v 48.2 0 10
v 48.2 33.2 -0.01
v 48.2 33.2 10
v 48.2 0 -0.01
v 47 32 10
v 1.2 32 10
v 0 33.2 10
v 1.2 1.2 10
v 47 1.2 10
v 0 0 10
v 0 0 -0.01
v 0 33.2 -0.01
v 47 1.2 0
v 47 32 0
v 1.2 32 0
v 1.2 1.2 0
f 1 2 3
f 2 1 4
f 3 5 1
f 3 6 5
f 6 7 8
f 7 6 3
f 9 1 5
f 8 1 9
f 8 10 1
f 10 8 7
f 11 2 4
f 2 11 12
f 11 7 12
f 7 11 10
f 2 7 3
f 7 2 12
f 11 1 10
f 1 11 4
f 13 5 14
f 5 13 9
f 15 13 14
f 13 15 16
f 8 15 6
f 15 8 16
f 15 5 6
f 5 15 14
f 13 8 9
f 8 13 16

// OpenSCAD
// file: ../Base/Rotation.scad
// Fischertechnik Box Foundation
// Geometry Helpers Rotation

include <PlacementOptions.scad>

// getRotatedSpace(space, rotation=NoRotation)
// Rotates the space dependent on the specified rotation

function getRotatedSpace(space, rotation=NoRotation) = [
    (rotation == Rotate90 || rotation == Rotate270) ? space.y : space.x,
    (rotation == Rotate90 || rotation == Rotate270) ? space.x : space.y
];

// Rotates the given space around the fixed left lower corner
// space = the space the children needs as width/depth list [width,depth]
// rotation = 0 Rotate0 degrees, 1 Rotate90 degrees, 2 Rotate180 degrees, 3 Rotate270 degrees (equivalent to -90)

module RotateFix(space, rotation=NoRotation) {
    dy = (rotation == Rotate0 || rotation == Rotate270) ? 0 :
        (rotation == Rotate90) ? space.x :
        space.y;
    dx = (rotation < Rotate180) ? 0 :
        (rotation == Rotate180) ? space.x :
        space.y;
    
    translate([dx, dy, 0])
        rotate([0, 0, rotations[rotation]])
            children();
}
// file: ../Base/Alignment.scad
// Fischertechnik Box Foundation
// Geometry Helpers Alignment

include <PlacementOptions.scad>

// getAlignedX(elementWidth, spaceWidth, align=AlignRight, offset=0)
// Gets the aligned X offset of an element with the given
// width in the given space.
// elementWidth = The width of the element to positon
// spaceWidth = The space where the element should be aligned
// align = 0 AlignLeft, 1 AlignCenter, 2 AlignRight
// offset = an optional offset from the aligned position. When
// aligned left or centered, then positive values are in X direction.
// When aligned right then positive values are in negative X direction.

function getAlignedX(elementWidth, spaceWidth, align=AlignRight, offset=0) =
    (align == AlignLeft) ?
        offset :
        ((align == AlignCenter) ?
        (spaceWidth - elementWidth)/2 + offset :
        spaceWidth - offset - elementWidth);

// getAlignedY(elementDepth, spaceDepth, align=AlignTop, offset=0)
// Gets the aligned Y offset of an element with the given
// depth in the given space.
// elementDepth = The depth of the element to positon
// spaceDepth = The space where the element should be aligned
// align = 0 AlignBottom, 1 AlignCenter, 2 AlignTop
// offset = an optional offset from the aligned position. When
// aligned bottom or centered, then positive values are in Y direction.
// When aligned top then positive values are in negative Y direction.

function getAlignedY(elementDepth, spaceDepth, align=AlignTop, offset=0) =
    (align == AlignBottom) ?
        offset :
        ((align == AlignCenter) ?
        (spaceDepth - elementDepth)/2 + offset :
        spaceDepth - offset - elementDepth);
// file: ../Base/PlacementOptions.scad
// Fischertechnik Box Foundation
// Placement Options

// Alignment
NoAlign = 0;
AlignLeft = 1;
AlignBottom = 2;
AlignCenter = 3;
AlignRight = 4;
AlignTop = 5;

// Element rotation degree steps
rotations = [0, -90, -180, -270];

// Rotation
NoRotation = 0;
Rotate0 = 0;
Rotate90 = 1;
Rotate180 = 2;
Rotate270 = 3;

// Docking (seen from above)
NoDock = -1;
DockLeft = 0;
DockTop = 1;
DockRight = 2;
DockCorner = 2;
DockBottom = 3;

// Web corners
LowerLeft = 0;
UpperLeft = 1;
UpperRight = 2;
LowerRight = 3;

// Web position relative to corner
LeftOfCorner = 0;
RightOfCorner = 1;
// file: ../Base/Boxes.scad
// Fischertechnik Box Foundation
// Pre-designed Boxes

use <Constants.scad>

include <PlacementOptions.scad>

box190Width = 190;
box190Depth = 130;
box130Width = 130;
box130Depth = 95;

// Values are from an original ec3 box
topBottomDifference = 1.5;
outerHeight = 40;
baseThickness = 1.8;
innerHeight = outerHeight - baseThickness;
stackExcess = 5.7;
radius = 3.5;
wallThickness = 1.5;
tolerance = 0.2;

boxWallThickness = wallThickness;
boxBaseThickness = baseThickness;
boxWebWidth = 3.0;

// getBoxWallThickness()
// Gets the wall thickness of a Fischertechnik Box
function getBoxWallThickness() = boxWallThickness;

// getBoxUsageHeight(height = 38.2)
// Gets the usable height of a Fischertechnik box
// height = Outer height of the box from the bottom to the upper edge.
function getBoxUsageHeight(height = outerHeight) = height - baseThickness - stackExcess;

// getBoxInnerHeight()
// Gets the inner height of a Fischertechnik box, including the stack excess
function getBoxInnerHeight() = innerHeight;

// getBoxBaseThickness()
// Gets the thickness of the Fischertechnik box base.
function getBoxBaseThickness() = boxBaseThickness;

// getBoxWebWidth()
// Gets the width of a box web
function getBoxWebWidth() = boxWebWidth;

// getBox190Space()
// Gets the usable inner space of a Box 190 as an x/y-list
function getBox190Space() = [
    box190Width - 2*getBoxWallThickness() - topBottomDifference, 
    box190Depth - 2*getBoxWallThickness() - topBottomDifference ];

// RoundedCornerPlate(width, depth, height, radius)
// Creates a body plate with rounded corners for a box. Used
// also to create the complete box with the hull module.
// width = Width of the plate
// depth = depth of the plate 
// height = thickness of the plate
// radius = radius of the rounded corner
module RoundedCornerPlate(width, depth, height, radius) {
    translate([radius, radius])
    hull() {
        w = width-2*radius;
        d = depth-2*radius;
        cube([w, d, height]);
        cylinder(height, r=radius, $fn=getFragments());
        translate([w, 0])
            cylinder(height, r=radius, $fn=getFragments());
        translate([w, d])
            cylinder(height, r=radius, $fn=getFragments());
        translate([0, d])
            cylinder(height, r=radius, $fn=getFragments());
    }
}

// BoxBase(width, depth)
// Creates an empty stackable Fischertechnik compatible box
// width = Outer width of the box (190, 130, ...)
// depth = Outer depth of the box (130, 95, ...)

module BoxBase(width, depth, height=outerHeight) {    
    thinPlate = 0.01;

    innerHeight = height - baseThickness;    
    
    module Body(tolerance=tolerance) {
        hull() {
            // Bottom with tolerance to fit into the original boxes when stacked
            translate([-wallThickness+tolerance, -wallThickness+tolerance, -baseThickness])
                RoundedCornerPlate(width-topBottomDifference-2*tolerance, depth-topBottomDifference-2*tolerance, thinPlate, radius);
            
            // Top
            translate([-wallThickness-topBottomDifference/2, -wallThickness-topBottomDifference/2, innerHeight-thinPlate])
                RoundedCornerPlate(width, depth, thinPlate, radius);
         }
    }

    module Cutoff() {
        hull() {
            coWidth = width - 2*wallThickness;
            coDepth = depth - 2*wallThickness;
            
            // Bottom
            RoundedCornerPlate(coWidth-topBottomDifference, coDepth-topBottomDifference, thinPlate, radius);

            // Top
            translate([-topBottomDifference/2, -topBottomDifference/2, innerHeight+thinPlate]) 
                RoundedCornerPlate(coWidth, coDepth, thinPlate, radius);
        }
    }
    
    difference() {        
        Body();
        Cutoff();
        stackOffset = innerHeight - stackExcess;
        translate([0, 0, stackOffset + baseThickness])
            Body(tolerance=0);
    }
}

// Creates the Fischertechnik empty box 130x190 mm and places it at position 0,0
// 190x130 are the outer sizes, the inner space is slightly smaller. Use getBox190Space() to get the inner sizes.
// The box is positioned that the usable inner space is at the 0,0,0 position.

module Box190() {
    BoxBase(box190Width, box190Depth);
}

// Gets the usable inner space of a Box 130 as an x/y-list
function getBox130Space() = [
    box130Width - 2*getBoxWallThickness() - topBottomDifference, 
    box130Depth - 2*getBoxWallThickness() - topBottomDifference ];

// Creates the Fischertechnik empty box 95x130 mm and places it at position 0,0
// 190x130 are the outer sizes, the inner space is slightly smaller. Use getBox190Space() to get the inner sizes.
// The box is positioned that the usable inner space is at the 0,0,0 position.

module Box130() {
    BoxBase(box130Width, box130Depth);
}

// Creates a web at the specified box walls
// corner 0 = LowerLeft, 1 = UpperLeft, 2 = UpperRight, 3 = LowerRight
// side 0 = LeftOfCorner, 1 = RightOfCorner
// distance = Distance in mm from the corner
// boxSpace = inner width and depth of the box (default: Box 190)
// webWidth = length of the web (default is 3 mms)
// webThickness = thickness of the web (default is 1 mm)
// height = Height of the web (standard is getBoxUsageHeight())
// sink = How much of the web is sunk into the wall

module BoxWeb(
    corner, 
    side, 
    distance, 
    boxSpace=getBox190Space(), 
    webWidth=getBoxWebWidth(), 
    webThickness=1.0, 
    height=getBoxUsageHeight(),
    sink = getBoxWallThickness()/2) {
    width = (corner % 2 == 0) ? 
            (side == LeftOfCorner ? webWidth : webThickness) :
            (side == LeftOfCorner ? webThickness : webWidth);

    depth = (corner % 2 == 0) ? 
            (side == RightOfCorner ? webWidth : webThickness) :
            (side == RightOfCorner ? webThickness : webWidth);
    
    xDiff = corner == LowerLeft ? 
                (side == LeftOfCorner ? -sink : distance) :
            (corner == UpperLeft ?                
                (side == LeftOfCorner ? distance : -sink) :
            (corner == UpperRight ?
                (side == LeftOfCorner ? boxSpace.x-webWidth+sink : boxSpace.x-distance-webThickness) :
                (side == LeftOfCorner ? boxSpace.x-distance-webThickness: boxSpace.x-webWidth+sink)));

    yDiff = corner == LowerLeft ? 
                (side == RightOfCorner ? -sink : distance) :
            (corner == UpperLeft ?
                (side == RightOfCorner ? boxSpace.y-distance-webThickness : boxSpace.y-webWidth+sink) :
            (corner == UpperRight ?
                (side == RightOfCorner ? boxSpace.y-webWidth+sink : boxSpace.y-distance-webThickness) :
                (side == RightOfCorner ? distance : -sink)));
    
    translate([xDiff, yDiff, -getExcess()])
        cube([width, depth, height + 2*getExcess()]);
}
// file: ../Base/Placement.scad
// Fischertechnik Box Foundation
// Geometry Helpers Placement

use <Constants.scad>
use <Alignment.scad>
use <Rotation.scad>
use <Boxes.scad>

include <PlacementOptions.scad>

// Place(x=0, y=0, elementSpace=[0,0], alignX=AlignLeft, alignY=AlignBottom, rotation=Rotate0, boxSpace=getBox190Space())
// Places the child at the specified position
// y = Y-Position. This is a relative position when an X aligment is specified.
// x = X-Position. This is a relative position when an Y aligment is specified.
// elementSpace = space of the element to be placed [x,y]
// alignX = -1=NoAlign, 0 AlignLeft, 1 AlignCenter, 3 AlignRight (elementSpace and boxSpace required!)
// alignY = -1=NoAlign, 2 AlignBottom, 1 AlignCenter, 4 AlignTop (elementSpace and boxSpace required!)
// rotation = 0 Rotate0 0 degrees, 1 Rotate90 90 degrees, 
// 2 Rotate180 180 degrees, 3 Rotate270 270 degrees (equivalent to -90)
// boxSpace = Inner space of the box where the placement occurs [x,y] - default is Box 190x130 inner space

module Place(x=0, y=0, elementSpace=[0,0], 
  alignX=AlignLeft, alignY=AlignBottom, 
  rotation=NoRotation, boxSpace=getBox190Space()) {

    module Position(x, y, space, rotation=Rotate0) {
        translate([x, y, 0])
            RotateFix(space, rotation)
                children();
    }

    space = getRotatedSpace(elementSpace, rotation);
    alignedX = getAlignedX(space.x, boxSpace.x, alignX, x);
    alignedY = getAlignedY(space.y, boxSpace.y, alignY, y);
    Position(alignedX, alignedY, elementSpace, rotation)
        children();
}

// Center(space=getBox130Space(), elementSpace=[0,0])
// space = Space where the children is centered. For cylinder use centered=true and no elementSpace.
// elementSpace = space of the element to be centered [x,y]

module Center(space=getBox190Space(), elementSpace=[0,0]) {
    Place(elementSpace=elementSpace, boxSpace=space, alignX=AlignCenter, alignY=AlignCenter)
        children();
}

// CenterHorizontal(width=0, y=0, offset=0, space=getBox130Space())
// width = Width of the element to be placed.
// y = Y position of the element
// offset = Offset from the center position (negative will be left of the center)
// space = Space where the element is placed

module CenterHorizontal(width=0, y=0, offset=0, space=getBox190Space()) {
    Place(x=offset, y=y, elementSpace=[width, 0], boxSpace=space, alignX=AlignCenter)
        children(0);
}

// CenterVertical(depth=0, x=0, offset=0, space=getBox130Space())
// depth = Depth of the element to be placed.
// x = X position of the element
// offset = Offset from the center position (negative will be down of the center)
// space = Space where the element is placed

module CenterVertical(depth=0, x=0, offset=0, space=getBox190Space()) {
    Place(x=x, y=offset, elementSpace=[0, depth], boxSpace=space, alignY=AlignCenter)
        children(0);
}

// getIsVertical(align)
// True if the specified alignment needs a vertical orientation for a divider (AlignRight, AlignLeft)

function getIsVertical(align) = (align == AlignRight || align == AlignLeft);

// getIsHorizontal(align)
// True if the specified alignment needs a horizontal orientation for a divider (AlignTop, AlignBottom)

function getIsHorizontal(align) = (align == AlignTop || align == AlignBottom);
// file: ../Base/Constants.scad
// Fischertechnik Box Foundation
// Constants

// Constant values necessary for multiple elements

// Base constants
dividerThickness = 1.2;
excess = 0.01;
fragments = 90;
tolerance = 0.8;

// Gets the thickness of a divider 
function getDividerThickness() = dividerThickness;

// Gets the excess that is used to merge walls into each other
function getExcess() = excess;

// Gets amount of fragments of a cylinder
function getFragments() = fragments;

// Gets the inner tolerance of a frame to each side
function getTolerance() = tolerance;


// Fischertechnik specific constants
axisDiameter = 4;
axisBottomDiameter = axisDiameter + 1;
axisTolerance = 0.2;

// Gets axis diameter of Fischertechnik axis
function getAxisDiameter() = axisDiameter;

// Gets axis diameter tolerance (subtracted for element axis)
function getAxisTolerance() = axisTolerance;

// Gets the axis diameter for standing axis
function getStandAxisDiameter() = getAxisDiameter() - getAxisTolerance();

// Gets axis bottom diameter for thicker part at the bottom
function getAxisBottomDiameter() = axisBottomDiameter;

pinHeight = 2.5;

// gets the height of a connecting pin
function getPinHeight() = pinHeight;

standardEdgeDistance = 2.5;
standardWebDistance = 11.5;
standardCornerLength = 15;

// gets the standard distance to the wall of the box for dockable frames with webs
function getStandardEdgeDistance() = standardEdgeDistance;

// gets the standard distance of each web to the corner of the dockable frame
function getStandardWebDistance() = standardWebDistance;

// gets the standard length of the corner walls of a dockable frame
function getStandardCornerLength() = standardCornerLength;

tubeWallFactor = 0.8;

// gets the wall thickness of a tube.
function getTubeWallThickness() = tubeWallFactor * getDividerThickness();

smallPartsFrameHeight = 20;

// gets the frame height for docked small parts boxes.
function getSmallPartsFrameHeight() = smallPartsFrameHeight;

hubRingDiameter = 19.5;
hubRingLevelDiameter = 21;

// gets the diameter of a tube matching the inner ring of a wheel
function getHubRingDiameter() = hubRingDiameter;

// gets the diameter of a hub tube with a thicker diameter
function getHubRingLevelDiameter() = hubRingLevelDiameter;
// main file
// Fischertechnik Box Library
// Driver's Cab with Hole
// 38443

use <../Base/Constants.scad>
use <../ModelBase/Simple.scad>

/* [Hidden] */
width = 45;
depth = 30;
height = 10;

// getFrameDriversCabWithHoleSpace()
// Gets the space the frame driver's cab with hole needs as width (.x and .y as a list)

function getFrameDriversCabWithHoleSpace() = getFrameOuterVolume([width, depth, height]);

// FrameDriversCabWithHole()
// Frame for Driver's Cab With Hole
// 38443

module FrameDriversCabWithHole() {
    Frame([width, depth, height]);
}

// Test
color("lightgray") {
FrameDriversCabWithHole();
}
